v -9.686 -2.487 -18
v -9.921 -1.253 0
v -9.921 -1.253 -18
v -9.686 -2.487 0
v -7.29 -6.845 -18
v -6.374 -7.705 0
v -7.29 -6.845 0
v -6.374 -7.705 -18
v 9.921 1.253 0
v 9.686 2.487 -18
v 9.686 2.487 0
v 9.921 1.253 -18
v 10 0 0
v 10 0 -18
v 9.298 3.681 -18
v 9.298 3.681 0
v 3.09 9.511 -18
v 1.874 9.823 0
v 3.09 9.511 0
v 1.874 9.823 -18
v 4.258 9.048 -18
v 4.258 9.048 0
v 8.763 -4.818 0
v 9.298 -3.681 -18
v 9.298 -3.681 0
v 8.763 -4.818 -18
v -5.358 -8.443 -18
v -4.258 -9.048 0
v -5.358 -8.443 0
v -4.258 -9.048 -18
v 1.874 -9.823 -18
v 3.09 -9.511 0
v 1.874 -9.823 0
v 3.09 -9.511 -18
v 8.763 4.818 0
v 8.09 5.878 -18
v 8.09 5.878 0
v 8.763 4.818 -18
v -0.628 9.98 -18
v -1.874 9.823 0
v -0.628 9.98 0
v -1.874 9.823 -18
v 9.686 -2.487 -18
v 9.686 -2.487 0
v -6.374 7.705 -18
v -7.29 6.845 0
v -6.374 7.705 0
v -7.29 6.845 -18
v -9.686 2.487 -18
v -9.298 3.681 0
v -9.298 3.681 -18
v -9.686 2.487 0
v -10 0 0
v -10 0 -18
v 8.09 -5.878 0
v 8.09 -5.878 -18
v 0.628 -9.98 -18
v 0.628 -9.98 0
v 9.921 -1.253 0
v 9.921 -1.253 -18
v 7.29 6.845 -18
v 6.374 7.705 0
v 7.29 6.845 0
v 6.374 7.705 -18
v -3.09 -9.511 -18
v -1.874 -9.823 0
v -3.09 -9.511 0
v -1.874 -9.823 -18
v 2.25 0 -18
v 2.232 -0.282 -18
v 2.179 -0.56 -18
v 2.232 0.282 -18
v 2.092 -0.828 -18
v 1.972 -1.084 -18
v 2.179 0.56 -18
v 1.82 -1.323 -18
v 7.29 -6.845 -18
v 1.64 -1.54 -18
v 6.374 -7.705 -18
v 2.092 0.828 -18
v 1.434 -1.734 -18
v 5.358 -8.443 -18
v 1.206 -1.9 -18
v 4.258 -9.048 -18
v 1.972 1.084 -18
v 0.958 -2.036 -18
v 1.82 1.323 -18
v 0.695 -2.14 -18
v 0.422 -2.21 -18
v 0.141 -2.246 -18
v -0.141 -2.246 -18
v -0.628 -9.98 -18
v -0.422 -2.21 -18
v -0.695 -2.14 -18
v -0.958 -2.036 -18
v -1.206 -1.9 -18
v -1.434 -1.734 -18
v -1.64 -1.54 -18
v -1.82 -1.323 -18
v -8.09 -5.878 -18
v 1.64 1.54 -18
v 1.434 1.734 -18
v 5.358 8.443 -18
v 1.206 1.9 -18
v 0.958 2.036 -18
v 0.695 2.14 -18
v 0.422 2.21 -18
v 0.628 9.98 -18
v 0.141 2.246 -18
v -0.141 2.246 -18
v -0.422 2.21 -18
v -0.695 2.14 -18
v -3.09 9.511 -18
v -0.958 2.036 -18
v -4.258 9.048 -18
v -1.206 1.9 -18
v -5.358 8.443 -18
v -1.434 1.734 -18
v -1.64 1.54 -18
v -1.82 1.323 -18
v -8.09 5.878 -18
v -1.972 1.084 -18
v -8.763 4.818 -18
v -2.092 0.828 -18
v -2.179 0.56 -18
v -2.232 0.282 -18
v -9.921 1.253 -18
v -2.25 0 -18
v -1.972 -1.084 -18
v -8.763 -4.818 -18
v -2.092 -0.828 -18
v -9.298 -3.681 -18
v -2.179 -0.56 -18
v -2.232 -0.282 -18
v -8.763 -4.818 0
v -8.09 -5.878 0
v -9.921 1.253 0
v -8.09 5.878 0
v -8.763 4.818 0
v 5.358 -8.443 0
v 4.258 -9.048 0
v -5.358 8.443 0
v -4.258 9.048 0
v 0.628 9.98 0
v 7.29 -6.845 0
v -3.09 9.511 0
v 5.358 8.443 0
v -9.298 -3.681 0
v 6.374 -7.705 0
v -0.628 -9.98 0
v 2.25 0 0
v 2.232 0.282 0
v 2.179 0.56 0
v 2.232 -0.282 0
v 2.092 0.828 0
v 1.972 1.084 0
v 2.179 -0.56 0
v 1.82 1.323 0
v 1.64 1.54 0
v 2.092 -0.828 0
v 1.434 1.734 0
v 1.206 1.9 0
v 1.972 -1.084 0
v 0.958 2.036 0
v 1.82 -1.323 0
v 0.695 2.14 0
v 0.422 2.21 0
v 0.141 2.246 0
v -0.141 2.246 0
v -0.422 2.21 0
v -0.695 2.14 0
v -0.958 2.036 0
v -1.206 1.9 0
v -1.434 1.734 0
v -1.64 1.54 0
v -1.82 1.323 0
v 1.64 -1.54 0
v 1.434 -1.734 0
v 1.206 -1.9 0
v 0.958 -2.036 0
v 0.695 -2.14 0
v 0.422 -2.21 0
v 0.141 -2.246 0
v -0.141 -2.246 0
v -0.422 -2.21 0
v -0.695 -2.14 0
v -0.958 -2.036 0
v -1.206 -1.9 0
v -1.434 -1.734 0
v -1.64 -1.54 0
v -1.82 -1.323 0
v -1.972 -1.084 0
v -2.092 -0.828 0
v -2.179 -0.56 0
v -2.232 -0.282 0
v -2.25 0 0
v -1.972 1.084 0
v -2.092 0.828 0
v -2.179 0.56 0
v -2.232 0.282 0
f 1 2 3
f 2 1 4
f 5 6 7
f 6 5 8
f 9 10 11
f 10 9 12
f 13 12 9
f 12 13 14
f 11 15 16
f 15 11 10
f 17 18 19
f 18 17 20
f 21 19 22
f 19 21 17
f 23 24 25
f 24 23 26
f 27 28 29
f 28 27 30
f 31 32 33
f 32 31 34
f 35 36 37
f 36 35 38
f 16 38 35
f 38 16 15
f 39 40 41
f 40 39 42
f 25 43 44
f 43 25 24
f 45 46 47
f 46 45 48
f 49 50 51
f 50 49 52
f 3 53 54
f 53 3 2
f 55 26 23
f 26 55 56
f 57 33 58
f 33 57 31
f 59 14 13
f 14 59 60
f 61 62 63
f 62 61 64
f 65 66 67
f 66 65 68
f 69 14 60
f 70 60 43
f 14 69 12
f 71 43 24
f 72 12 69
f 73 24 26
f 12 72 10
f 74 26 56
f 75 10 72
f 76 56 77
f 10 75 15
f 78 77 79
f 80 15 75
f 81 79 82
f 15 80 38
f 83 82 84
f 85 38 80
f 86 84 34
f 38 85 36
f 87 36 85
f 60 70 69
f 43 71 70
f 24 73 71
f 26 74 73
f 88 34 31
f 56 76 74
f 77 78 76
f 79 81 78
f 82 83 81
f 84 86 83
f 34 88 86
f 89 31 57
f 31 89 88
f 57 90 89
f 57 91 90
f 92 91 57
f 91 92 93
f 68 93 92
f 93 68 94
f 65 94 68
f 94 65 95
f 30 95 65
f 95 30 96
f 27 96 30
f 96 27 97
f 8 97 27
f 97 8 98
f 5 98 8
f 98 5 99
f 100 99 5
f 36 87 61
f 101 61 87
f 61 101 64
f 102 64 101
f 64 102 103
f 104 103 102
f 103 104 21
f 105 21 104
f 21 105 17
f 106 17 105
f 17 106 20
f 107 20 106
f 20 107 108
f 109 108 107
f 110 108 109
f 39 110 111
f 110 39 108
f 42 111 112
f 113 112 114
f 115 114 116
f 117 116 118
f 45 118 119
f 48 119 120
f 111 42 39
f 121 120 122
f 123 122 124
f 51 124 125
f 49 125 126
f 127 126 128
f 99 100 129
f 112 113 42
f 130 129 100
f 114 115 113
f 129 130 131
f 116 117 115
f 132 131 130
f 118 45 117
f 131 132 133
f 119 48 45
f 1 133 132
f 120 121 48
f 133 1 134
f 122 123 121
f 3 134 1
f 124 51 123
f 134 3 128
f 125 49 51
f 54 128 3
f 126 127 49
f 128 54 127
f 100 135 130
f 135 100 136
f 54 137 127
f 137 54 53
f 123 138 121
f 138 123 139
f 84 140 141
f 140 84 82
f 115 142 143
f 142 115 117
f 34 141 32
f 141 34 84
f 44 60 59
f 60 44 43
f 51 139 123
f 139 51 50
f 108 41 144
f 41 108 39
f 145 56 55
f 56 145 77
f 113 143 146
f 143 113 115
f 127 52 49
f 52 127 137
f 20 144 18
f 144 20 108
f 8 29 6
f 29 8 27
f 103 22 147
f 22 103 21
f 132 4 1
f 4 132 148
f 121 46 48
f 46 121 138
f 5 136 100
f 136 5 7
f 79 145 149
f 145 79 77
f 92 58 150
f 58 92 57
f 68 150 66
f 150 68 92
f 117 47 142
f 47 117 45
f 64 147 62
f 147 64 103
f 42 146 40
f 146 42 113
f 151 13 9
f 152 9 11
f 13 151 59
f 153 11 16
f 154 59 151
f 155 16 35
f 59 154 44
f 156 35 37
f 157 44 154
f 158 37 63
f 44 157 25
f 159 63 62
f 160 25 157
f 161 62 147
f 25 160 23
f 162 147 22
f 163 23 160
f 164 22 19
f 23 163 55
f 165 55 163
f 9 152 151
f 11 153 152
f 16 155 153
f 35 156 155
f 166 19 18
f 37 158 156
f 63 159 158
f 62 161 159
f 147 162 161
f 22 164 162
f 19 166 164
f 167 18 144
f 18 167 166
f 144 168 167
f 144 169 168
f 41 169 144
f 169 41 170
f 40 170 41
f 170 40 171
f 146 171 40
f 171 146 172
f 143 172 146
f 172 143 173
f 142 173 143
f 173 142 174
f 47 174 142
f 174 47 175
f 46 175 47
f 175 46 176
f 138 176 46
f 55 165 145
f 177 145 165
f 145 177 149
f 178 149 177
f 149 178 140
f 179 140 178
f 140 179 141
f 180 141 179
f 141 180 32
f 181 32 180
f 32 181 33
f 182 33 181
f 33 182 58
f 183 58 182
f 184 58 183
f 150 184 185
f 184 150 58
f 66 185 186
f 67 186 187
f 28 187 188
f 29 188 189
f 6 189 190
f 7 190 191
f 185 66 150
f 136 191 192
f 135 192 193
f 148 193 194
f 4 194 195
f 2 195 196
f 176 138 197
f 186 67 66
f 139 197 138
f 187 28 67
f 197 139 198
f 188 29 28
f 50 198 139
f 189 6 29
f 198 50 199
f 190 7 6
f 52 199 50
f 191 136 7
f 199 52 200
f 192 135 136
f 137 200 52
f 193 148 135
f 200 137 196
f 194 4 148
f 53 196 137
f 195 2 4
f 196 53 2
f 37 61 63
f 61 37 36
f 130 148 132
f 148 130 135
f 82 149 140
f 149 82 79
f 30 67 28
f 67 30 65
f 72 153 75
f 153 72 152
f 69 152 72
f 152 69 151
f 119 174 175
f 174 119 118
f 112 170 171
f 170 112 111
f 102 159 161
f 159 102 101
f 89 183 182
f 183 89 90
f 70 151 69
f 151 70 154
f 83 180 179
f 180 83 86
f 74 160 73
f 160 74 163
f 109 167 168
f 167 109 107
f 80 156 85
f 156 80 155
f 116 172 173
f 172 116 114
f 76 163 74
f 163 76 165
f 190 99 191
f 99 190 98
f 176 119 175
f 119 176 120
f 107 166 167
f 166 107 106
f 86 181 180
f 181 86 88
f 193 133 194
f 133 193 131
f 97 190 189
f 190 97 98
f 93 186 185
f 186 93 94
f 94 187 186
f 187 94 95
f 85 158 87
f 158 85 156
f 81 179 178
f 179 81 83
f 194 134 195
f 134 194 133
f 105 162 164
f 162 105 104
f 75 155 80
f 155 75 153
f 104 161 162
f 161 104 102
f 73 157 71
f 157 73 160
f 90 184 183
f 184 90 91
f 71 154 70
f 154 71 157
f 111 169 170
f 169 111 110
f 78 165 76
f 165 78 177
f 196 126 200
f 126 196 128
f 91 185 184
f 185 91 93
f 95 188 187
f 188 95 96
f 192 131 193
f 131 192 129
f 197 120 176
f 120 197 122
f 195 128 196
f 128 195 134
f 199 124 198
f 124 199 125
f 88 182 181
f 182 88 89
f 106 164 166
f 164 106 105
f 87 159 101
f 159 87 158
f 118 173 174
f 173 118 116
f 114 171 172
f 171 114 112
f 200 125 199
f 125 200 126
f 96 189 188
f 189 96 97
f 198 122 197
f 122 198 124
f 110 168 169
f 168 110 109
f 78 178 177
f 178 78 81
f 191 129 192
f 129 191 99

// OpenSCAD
$fn = 50;


difference() {
	union() {
		translate(v = [0, 0, -18.0000000000]) {
			cylinder(h = 18, r = 10.0000000000);
		}
	}
	union() {
		#translate(v = [0, 0, -18]) {
			cylinder(h = 18, r = 2.2500000000);
		}
	}
}
